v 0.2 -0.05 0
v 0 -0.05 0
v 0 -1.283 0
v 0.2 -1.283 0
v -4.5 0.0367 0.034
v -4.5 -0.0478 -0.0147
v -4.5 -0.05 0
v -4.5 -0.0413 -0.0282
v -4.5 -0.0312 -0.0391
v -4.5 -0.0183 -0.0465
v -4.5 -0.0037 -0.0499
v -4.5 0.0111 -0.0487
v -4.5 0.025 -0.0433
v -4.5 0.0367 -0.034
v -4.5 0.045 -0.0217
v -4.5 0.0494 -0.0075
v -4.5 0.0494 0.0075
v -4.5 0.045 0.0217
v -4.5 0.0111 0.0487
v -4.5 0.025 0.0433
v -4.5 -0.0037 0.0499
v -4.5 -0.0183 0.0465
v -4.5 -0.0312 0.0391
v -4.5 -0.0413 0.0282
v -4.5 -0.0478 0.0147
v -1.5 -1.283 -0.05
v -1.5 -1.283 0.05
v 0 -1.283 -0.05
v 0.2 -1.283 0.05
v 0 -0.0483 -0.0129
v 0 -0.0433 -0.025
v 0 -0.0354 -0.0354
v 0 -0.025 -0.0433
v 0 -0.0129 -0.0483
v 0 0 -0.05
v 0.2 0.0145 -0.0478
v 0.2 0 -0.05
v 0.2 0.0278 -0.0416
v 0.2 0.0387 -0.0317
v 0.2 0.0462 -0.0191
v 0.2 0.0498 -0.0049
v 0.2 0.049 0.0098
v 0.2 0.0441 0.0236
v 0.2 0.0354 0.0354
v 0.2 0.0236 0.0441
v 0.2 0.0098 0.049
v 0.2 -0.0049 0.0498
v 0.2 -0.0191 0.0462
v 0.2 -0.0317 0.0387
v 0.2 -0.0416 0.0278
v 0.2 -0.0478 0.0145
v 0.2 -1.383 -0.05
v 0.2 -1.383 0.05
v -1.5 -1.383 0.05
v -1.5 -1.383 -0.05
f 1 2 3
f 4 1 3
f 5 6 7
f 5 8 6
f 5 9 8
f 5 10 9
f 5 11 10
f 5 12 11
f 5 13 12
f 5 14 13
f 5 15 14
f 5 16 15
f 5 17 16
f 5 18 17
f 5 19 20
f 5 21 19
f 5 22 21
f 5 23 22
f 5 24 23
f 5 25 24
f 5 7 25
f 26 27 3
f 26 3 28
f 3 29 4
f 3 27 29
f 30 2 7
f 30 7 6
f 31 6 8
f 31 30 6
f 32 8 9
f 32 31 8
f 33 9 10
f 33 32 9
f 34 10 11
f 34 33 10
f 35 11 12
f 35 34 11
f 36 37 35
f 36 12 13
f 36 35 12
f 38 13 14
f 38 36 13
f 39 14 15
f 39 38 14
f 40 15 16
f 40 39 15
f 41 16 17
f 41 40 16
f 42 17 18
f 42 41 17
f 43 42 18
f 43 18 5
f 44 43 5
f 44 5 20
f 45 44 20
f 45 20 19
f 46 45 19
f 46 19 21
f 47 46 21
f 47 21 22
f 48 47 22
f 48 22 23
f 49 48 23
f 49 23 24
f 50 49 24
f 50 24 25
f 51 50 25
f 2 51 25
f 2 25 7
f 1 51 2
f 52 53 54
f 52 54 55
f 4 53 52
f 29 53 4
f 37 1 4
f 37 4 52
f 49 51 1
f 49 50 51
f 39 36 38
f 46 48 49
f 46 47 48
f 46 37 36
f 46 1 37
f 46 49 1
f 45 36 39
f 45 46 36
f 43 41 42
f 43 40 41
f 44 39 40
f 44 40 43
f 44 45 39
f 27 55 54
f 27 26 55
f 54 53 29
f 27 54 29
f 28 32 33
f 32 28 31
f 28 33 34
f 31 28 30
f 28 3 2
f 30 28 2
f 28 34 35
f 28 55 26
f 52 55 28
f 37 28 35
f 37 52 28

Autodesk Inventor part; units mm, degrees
ref_plane "YZ Plane" through (0, 0, 0) normal (1, 0, 0) x (0, 1, 0)
ref_plane "XZ Plane" through (0, 0, 0) normal (0, 1, 0) x (-1, 0, 0)
ref_plane "XY Plane" through (0, 0, 0) normal (0, 0, 1) x (1, 0, 0)
sketch "Sketch1" plane through (0, 0, 0) normal (1, 0, 0) x (0, 1, 0)
  circle A0 centre (0, 0) radius 0.05
  line L0 (0, 0) -> (-1.333, 0)
  line L1 (-1.383, 0.05) -> (-1.283, 0.05)
  line L2 (-1.283, 0.05) -> (-1.283, -0.05)
  line L3 (-1.283, -0.05) -> (-1.383, -0.05)
  line L4 (-1.383, -0.05) -> (-1.383, 0.05)
  line L5 (-1.383, 0.05) -> (-1.283, -0.05) construction
  line L6 (-1.283, 0.05) -> (-1.383, -0.05) construction
  line L7 (-1.283, -0.05) -> (0, -0.05)
  point P0 (-0.05, 0)
  point P1 (-1.283, 0)
  dimension "d0" = 0.1
  dimension "d1" = 1.333
  dimension "d2" = 0.1
  dimension "d3" = 0.1
extrude "Extrusion1" add sketch "Sketch1" along normal blind 0.2
sketch "Sketch2" plane through (0, 0, 0) normal (-1, 0, 0) x (0, 0, 1)
  arc A0 (0, -0.05) -> (-0.05, 0) centre (0, 0) ccw projected
  circle A1 centre (0, 0) radius 0.05
  point P0 (-0.05, 0)
  point P1 (0, -0.05)
  dimension "d6" = 0.1
extrude "Extrusion2" add sketch "Sketch2" along normal blind 4.5
sketch "Sketch3" plane through (0, 0, 0) normal (-1, 0, 0) x (0, 0, 1)
  line L0 (-0.05, -1.383) -> (-0.05, 0) projected
  line L1 (0.05, -1.383) -> (-0.05, -1.383) projected
  line L2 (-0.05, -1.383) -> (0.05, -1.383)
  line L3 (0, -1.283) -> (0.05, -1.283) projected
  line L4 (0.05, -1.383) -> (0.05, -1.283)
  line L5 (0.05, -1.283) -> (-0.05, -1.283)
  line L6 (-0.05, -1.283) -> (-0.05, -1.383)
  point P0 (0, 0)
extrude "Extrusion3" add sketch "Sketch3" along normal blind 1.5
properties part number "Bone21_20_Fix"
